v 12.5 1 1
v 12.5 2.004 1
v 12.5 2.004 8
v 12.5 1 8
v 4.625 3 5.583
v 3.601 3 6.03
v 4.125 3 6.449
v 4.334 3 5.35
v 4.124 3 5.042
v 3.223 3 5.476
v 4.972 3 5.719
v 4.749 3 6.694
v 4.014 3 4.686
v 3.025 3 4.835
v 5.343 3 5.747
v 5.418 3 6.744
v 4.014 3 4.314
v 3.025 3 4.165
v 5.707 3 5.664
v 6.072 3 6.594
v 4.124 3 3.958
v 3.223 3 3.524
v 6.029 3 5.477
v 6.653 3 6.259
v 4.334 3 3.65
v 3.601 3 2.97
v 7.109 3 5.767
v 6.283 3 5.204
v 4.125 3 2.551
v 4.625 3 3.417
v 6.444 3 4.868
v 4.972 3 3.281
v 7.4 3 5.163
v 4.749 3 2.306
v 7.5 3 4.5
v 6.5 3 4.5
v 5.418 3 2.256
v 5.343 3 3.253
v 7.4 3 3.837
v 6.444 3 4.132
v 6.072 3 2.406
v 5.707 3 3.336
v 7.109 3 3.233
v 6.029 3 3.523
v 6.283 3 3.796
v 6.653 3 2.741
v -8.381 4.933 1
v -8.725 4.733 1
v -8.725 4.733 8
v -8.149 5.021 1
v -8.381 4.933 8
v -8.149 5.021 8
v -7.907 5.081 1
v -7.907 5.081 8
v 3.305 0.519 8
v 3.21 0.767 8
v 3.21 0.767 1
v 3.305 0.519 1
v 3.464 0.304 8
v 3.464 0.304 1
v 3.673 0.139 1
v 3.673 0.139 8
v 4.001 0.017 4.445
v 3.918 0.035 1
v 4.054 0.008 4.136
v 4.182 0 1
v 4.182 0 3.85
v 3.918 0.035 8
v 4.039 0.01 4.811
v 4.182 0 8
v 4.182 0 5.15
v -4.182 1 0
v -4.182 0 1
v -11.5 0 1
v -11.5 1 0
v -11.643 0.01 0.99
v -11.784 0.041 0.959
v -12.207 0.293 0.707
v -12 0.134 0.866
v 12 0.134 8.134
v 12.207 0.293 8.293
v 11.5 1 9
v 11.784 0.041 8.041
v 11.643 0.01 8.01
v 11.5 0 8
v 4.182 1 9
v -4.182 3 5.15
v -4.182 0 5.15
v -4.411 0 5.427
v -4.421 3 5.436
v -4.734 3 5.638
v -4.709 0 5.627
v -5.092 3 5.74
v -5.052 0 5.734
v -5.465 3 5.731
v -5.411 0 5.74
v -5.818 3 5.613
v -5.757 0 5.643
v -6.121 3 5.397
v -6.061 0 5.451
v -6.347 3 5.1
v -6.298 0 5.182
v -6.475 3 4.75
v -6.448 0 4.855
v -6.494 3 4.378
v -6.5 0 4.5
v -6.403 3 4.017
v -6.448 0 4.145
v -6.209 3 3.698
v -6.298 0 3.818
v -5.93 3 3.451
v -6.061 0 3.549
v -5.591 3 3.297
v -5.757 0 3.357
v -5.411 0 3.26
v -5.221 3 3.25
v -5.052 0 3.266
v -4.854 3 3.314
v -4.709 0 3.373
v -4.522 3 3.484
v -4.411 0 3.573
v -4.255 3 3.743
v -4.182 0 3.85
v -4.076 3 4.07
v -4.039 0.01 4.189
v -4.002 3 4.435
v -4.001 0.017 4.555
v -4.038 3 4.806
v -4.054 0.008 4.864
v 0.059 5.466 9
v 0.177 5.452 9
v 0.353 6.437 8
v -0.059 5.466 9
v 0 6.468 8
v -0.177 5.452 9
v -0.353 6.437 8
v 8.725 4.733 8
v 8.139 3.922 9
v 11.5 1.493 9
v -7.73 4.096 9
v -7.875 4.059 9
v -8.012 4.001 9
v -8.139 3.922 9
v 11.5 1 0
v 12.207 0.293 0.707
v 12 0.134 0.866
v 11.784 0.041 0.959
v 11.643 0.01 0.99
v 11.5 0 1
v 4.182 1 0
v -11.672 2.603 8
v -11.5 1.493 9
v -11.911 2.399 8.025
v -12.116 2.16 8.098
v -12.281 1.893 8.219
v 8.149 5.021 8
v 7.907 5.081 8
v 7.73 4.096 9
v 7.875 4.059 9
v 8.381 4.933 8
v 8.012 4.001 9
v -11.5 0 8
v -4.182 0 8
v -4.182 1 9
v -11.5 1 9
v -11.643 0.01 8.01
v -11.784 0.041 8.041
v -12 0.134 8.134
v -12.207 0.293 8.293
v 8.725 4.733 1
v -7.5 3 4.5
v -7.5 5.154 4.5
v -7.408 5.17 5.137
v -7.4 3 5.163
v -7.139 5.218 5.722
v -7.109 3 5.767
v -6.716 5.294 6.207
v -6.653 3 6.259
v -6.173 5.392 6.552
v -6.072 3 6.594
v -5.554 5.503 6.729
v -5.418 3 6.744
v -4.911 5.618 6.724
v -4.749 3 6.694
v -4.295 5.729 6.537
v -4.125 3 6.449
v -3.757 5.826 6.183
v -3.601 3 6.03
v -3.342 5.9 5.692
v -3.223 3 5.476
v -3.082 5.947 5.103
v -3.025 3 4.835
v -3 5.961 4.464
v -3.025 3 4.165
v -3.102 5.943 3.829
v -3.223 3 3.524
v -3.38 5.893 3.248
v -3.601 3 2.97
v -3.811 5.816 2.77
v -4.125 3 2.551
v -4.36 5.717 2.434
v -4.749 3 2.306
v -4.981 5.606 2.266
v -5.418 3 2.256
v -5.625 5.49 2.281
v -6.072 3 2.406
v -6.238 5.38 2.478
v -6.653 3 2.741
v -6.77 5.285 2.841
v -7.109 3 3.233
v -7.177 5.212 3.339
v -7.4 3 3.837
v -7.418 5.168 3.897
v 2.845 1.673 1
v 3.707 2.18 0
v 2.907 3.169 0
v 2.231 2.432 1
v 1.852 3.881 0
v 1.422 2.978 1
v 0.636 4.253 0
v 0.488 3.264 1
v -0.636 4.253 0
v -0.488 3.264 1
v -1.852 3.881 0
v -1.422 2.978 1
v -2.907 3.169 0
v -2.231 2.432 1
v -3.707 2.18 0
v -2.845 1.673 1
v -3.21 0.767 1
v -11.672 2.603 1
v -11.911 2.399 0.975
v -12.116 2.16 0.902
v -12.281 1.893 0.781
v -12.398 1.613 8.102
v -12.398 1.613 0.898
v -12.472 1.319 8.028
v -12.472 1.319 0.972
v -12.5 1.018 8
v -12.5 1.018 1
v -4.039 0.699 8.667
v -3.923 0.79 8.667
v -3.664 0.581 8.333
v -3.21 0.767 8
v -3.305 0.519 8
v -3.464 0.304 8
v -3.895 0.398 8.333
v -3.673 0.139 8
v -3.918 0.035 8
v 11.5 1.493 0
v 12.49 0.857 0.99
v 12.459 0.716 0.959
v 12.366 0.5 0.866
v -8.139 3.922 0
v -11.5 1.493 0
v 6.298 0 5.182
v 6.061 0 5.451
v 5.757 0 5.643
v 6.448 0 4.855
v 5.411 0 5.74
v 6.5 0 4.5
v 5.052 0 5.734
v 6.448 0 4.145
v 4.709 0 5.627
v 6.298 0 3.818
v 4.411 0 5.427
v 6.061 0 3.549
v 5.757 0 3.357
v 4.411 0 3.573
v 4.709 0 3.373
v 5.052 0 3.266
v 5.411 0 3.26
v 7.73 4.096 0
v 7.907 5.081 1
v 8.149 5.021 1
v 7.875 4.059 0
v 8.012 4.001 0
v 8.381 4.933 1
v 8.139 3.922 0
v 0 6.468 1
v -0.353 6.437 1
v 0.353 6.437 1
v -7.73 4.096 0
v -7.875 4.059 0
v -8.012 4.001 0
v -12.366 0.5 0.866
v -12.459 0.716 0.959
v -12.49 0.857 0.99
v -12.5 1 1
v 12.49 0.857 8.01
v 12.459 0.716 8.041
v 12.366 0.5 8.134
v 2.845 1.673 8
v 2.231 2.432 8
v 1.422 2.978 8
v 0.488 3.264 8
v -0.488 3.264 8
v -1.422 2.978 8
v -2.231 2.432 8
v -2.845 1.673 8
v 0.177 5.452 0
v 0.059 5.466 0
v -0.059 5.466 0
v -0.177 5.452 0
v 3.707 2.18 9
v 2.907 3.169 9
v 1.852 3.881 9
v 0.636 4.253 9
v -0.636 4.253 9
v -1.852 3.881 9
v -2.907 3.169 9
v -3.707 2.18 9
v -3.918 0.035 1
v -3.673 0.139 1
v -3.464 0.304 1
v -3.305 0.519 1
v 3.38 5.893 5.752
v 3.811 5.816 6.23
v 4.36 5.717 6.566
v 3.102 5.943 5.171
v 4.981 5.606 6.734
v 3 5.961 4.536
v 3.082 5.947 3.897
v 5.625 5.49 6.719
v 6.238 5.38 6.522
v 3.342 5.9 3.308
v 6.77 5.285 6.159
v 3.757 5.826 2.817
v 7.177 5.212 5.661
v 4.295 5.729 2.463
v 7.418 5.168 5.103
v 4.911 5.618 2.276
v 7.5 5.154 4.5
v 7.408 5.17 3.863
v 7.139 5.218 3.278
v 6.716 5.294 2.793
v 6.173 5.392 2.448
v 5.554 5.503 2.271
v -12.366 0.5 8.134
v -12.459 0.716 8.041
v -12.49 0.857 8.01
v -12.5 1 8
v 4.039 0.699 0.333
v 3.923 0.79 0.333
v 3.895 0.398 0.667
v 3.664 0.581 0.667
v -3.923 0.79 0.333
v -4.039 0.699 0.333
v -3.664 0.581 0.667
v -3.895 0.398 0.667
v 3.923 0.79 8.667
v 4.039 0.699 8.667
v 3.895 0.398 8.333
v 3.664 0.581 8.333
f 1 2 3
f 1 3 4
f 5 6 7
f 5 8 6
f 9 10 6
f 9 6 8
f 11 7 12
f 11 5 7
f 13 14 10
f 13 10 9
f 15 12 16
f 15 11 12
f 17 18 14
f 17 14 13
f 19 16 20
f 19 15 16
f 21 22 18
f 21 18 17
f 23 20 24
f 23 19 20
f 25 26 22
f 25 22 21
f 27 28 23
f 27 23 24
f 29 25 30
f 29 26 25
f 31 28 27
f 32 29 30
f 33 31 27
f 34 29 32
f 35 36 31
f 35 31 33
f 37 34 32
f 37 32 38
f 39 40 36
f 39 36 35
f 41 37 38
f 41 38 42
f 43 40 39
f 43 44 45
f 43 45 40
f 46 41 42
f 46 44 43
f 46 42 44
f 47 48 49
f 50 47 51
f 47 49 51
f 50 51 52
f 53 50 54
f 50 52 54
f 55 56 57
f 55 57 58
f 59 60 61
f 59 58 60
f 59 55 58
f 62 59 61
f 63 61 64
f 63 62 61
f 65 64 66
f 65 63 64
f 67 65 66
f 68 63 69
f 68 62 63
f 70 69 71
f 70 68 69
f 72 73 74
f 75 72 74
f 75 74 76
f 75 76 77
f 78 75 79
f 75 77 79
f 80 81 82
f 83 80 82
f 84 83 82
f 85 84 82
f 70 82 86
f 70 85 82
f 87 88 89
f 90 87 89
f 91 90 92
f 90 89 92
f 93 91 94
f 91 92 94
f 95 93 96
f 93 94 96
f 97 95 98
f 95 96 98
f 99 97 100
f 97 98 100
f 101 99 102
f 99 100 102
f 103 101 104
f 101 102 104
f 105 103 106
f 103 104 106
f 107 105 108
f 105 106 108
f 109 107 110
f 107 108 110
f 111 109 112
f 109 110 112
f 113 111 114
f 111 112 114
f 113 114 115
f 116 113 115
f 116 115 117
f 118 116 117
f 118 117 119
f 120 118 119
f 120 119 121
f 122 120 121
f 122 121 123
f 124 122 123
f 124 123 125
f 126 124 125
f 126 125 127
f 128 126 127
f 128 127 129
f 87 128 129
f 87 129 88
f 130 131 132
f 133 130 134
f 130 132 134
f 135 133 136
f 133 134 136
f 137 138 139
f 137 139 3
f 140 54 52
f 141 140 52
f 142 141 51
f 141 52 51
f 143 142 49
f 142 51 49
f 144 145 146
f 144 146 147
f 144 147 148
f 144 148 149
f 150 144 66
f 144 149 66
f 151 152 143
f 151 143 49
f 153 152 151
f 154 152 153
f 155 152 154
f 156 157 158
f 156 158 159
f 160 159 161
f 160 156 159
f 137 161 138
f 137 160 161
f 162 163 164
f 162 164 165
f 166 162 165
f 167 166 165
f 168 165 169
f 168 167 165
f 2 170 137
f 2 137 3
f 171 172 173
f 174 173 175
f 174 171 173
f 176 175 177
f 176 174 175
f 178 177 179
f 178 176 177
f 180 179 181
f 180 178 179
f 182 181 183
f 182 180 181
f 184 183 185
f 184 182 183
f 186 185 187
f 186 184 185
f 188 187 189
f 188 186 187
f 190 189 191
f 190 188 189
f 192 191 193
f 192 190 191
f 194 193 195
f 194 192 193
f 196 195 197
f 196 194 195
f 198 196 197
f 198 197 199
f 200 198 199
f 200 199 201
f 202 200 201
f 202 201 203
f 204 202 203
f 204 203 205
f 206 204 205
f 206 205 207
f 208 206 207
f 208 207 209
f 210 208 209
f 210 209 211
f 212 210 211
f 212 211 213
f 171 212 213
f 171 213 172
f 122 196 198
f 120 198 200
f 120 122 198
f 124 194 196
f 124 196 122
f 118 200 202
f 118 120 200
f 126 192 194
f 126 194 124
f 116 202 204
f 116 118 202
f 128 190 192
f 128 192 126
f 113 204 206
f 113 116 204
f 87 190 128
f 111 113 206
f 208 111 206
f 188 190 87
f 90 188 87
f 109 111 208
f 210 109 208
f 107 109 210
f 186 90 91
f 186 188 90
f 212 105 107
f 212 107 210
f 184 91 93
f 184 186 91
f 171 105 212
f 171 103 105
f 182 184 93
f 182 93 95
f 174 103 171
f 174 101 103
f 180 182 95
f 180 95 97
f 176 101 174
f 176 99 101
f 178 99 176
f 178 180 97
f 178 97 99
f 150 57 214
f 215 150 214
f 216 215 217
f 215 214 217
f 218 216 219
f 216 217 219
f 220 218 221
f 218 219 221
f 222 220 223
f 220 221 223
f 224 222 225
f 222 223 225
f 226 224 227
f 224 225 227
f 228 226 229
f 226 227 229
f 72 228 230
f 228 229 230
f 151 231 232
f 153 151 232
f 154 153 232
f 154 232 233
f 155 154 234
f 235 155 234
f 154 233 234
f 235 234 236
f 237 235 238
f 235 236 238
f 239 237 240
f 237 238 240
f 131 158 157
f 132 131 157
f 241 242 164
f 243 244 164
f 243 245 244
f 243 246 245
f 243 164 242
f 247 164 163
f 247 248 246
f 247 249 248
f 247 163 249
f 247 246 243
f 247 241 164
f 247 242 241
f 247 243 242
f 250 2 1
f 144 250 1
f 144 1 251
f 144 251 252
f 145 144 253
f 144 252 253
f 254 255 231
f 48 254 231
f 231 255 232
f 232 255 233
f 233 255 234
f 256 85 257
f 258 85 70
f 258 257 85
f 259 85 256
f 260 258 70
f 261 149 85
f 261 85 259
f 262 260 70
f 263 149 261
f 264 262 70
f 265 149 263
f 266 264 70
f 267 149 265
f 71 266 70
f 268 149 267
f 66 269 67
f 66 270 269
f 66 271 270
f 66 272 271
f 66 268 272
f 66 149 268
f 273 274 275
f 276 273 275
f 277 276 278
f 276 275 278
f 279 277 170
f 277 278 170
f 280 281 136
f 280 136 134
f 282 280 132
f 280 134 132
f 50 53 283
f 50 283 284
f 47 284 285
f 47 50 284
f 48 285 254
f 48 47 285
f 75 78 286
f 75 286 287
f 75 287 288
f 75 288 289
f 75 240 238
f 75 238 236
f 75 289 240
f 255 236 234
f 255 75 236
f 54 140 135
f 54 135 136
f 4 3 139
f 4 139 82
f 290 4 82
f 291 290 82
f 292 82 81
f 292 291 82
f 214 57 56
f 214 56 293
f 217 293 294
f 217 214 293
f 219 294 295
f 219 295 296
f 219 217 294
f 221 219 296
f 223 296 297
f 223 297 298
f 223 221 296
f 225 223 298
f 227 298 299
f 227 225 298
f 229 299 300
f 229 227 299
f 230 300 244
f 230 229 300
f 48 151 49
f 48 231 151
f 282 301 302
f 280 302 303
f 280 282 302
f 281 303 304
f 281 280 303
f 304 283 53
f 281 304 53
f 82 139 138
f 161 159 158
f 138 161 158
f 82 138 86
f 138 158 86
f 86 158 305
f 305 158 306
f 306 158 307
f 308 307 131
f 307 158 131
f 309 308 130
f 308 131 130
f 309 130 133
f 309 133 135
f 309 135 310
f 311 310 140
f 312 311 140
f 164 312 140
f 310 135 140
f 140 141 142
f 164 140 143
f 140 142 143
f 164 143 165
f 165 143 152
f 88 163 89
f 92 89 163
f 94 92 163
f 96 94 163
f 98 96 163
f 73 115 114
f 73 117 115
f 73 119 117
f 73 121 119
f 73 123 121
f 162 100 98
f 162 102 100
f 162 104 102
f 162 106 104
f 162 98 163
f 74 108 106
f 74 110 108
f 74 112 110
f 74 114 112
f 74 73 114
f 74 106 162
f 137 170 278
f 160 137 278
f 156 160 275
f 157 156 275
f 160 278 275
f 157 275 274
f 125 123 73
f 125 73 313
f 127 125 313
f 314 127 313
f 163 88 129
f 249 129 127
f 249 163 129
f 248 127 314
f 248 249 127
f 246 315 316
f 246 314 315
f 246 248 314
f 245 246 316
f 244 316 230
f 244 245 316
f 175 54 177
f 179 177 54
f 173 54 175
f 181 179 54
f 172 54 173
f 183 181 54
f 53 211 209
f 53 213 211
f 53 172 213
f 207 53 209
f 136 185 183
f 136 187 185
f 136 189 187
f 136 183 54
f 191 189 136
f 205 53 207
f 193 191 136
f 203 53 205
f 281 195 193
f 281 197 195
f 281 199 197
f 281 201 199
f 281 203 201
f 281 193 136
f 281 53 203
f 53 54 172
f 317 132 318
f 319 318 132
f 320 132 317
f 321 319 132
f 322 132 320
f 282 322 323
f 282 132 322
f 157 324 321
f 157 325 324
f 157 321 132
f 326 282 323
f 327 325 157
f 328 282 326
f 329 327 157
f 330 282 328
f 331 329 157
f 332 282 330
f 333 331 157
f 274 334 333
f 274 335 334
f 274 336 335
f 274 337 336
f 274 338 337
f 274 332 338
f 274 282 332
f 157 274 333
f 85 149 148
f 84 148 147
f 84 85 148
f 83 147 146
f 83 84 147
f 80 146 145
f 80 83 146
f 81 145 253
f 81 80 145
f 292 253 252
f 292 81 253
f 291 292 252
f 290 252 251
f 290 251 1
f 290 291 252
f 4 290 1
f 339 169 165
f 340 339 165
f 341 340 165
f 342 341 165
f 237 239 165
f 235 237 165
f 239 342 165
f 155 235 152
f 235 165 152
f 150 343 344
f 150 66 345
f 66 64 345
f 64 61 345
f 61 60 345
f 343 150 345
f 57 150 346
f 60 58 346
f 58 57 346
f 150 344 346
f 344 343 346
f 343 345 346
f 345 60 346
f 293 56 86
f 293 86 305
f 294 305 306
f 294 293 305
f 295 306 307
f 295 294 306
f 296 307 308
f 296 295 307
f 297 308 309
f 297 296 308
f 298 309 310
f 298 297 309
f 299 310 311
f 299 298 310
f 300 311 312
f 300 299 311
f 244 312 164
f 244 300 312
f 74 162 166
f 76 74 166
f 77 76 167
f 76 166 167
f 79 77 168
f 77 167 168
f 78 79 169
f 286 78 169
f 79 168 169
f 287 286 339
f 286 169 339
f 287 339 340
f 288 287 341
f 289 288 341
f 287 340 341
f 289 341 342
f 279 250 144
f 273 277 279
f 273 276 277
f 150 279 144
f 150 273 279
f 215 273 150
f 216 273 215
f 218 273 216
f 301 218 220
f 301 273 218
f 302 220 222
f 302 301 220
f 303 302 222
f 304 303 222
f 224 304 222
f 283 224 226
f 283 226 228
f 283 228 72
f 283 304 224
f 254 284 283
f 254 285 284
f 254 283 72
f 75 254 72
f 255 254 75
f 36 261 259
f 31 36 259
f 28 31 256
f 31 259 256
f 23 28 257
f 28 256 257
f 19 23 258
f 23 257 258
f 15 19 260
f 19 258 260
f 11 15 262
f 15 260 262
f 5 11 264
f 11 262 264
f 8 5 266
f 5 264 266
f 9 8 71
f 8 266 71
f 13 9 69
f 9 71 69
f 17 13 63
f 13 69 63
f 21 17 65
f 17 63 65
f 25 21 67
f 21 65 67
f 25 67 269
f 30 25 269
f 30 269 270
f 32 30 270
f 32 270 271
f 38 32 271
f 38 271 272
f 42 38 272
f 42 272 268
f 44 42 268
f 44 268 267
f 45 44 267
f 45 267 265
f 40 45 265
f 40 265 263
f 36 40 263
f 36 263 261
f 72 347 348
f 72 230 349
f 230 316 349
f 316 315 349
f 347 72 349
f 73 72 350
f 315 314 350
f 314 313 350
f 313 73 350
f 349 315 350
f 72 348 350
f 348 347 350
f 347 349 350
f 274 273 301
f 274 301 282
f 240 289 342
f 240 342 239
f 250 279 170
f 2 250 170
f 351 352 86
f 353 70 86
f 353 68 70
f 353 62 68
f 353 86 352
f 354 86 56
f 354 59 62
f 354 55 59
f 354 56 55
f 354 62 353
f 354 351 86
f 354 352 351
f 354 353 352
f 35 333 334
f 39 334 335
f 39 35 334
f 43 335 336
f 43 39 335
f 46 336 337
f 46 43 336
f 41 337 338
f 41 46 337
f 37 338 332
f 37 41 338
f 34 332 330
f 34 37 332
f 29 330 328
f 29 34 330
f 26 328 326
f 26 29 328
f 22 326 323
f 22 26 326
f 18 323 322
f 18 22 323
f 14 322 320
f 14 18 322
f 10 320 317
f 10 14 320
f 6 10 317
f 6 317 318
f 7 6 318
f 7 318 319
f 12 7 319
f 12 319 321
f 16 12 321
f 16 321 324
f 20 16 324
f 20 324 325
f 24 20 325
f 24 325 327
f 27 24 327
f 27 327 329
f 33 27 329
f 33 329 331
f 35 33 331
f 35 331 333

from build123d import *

# Parameters (mm, degrees)
BOSS_EXTRUDE1_DEPTH     = 9
CUT_EXTRUDE1_DEPTH      = 17.718253497
CUT_EXTRUDE1_DEPTH_BACK = 17.718253497
CHAMFER1_SIZE           = 1
FILLET3_R               = 1
SKETCH4_R               = 1.25
CUT_EXTRUDE2_DEPTH      = 17.718253497
CUT_EXTRUDE3_START      = 3
SKETCH5_R               = 2.25
CUT_EXTRUDE3_DEPTH      = 10
FILLET2_R               = 2
CHAMFER2_SIZE           = 1
CHAMFER3_SIZE           = 1


with BuildPart() as part:
    # Sketch1 → Boss-Extrude1 (new body)
    with BuildSketch(Plane.XY):
        with BuildLine():
            Line((-3.3, 0), (-12.5, 0))
            Line((-12.5, 0), (-12.5, 6.5))
            Line((-12.5, 6.5), (12.5, 6.5))
            Line((12.5, 6.5), (12.5, 0))
            Line((12.5, 0), (3.3, 0))
            ThreePointArc((3.3, 0), (0, 3.3), (-3.3, 0))
        make_face()
    extrude(amount=BOSS_EXTRUDE1_DEPTH)

    # Sketch2 → Cut-Extrude1 (cut, two sides: drawn at the far end of the back side and taken through both)
    with BuildSketch(Plane.XY.offset(9).offset(-CUT_EXTRUDE1_DEPTH_BACK)):
        Polygon((-8.355690819, 5), (0, 6.5), (-12.5, 6.5), (-12.5, 2.004439372), align=None)
        Polygon((12.5, 6.5), (0, 6.5), (8.355690819, 5), (12.5, 2.004439372), align=None)
    extrude(amount=CUT_EXTRUDE1_DEPTH + CUT_EXTRUDE1_DEPTH_BACK, mode=Mode.SUBTRACT)

    # Chamfer1
    chamfer1_edges = [part.edges().sort_by_distance(p)[0] for p in [
        (12.5, 1.002219686, 9),
        (-12.5, 1.002219686, 0),
        (-12.5, 1.002219686, 9),
        (12.5, 1.002219686, 0),
    ]]
    chamfer(chamfer1_edges, length=CHAMFER1_SIZE)

    # Fillet3
    fillet3_edges = [part.edges().sort_by_distance(p)[0] for p in [
        (12.5, 0, 4.5),
        (3.3, 0, 4.5),
        (-12.5, 0, 4.5),
        (-3.3, 0, 4.5),
    ]]
    fillet(fillet3_edges, radius=FILLET3_R)

    # Sketch4 → Cut-Extrude2 (cut, through all)
    with BuildSketch(Plane.XZ):
        with Locations(Location((-5.25, 4.5, 0), (0, 0, 31.315725107))):
            Circle(SKETCH4_R)
        with Locations((5.25, 4.5)):
            Circle(SKETCH4_R)
    extrude(amount=-CUT_EXTRUDE2_DEPTH, mode=Mode.SUBTRACT)

    # Sketch5 → Cut-Extrude3 (cut)
    with BuildSketch(Plane(origin=(0, 0, 0), x_dir=(1, 0, 0), z_dir=(0, 1, 0)).offset(CUT_EXTRUDE3_START)):
        with Locations(Location((-5.25, -4.5, 0), (0, 0, 180))):
            Circle(SKETCH5_R)
        with Locations((5.25, -4.5)):
            Circle(SKETCH5_R)
    extrude(amount=CUT_EXTRUDE3_DEPTH, mode=Mode.SUBTRACT)

    # Fillet2
    # the kernel refuses this fillet: 2 mm, written as the material it takes off along each edge
    with BuildSketch(Plane(origin=(8.355690819, 5, -1.139765225), x_dir=(0.8104519016588886, -0.5858051852770605, 0), z_dir=(0, 0, 1))) as fillet2_piece_1:
        with BuildLine():
            CenterArc((FILLET2_R * 0.227953044968, -FILLET2_R), FILLET2_R, 90, 25.682650877)
            Line((-FILLET2_R * 0.20543317424, -FILLET2_R * 0.0987917083155), (0, 0))
            Line((0, 0), (FILLET2_R * 0.227953044968, 0))
        make_face()
    extrude(amount=11.27953045, mode=Mode.SUBTRACT)
    with BuildSketch(Plane(origin=(-8.355690819, 5, 10.139765225), x_dir=(0.9842658682259174, 0.17669380477391092, 0), z_dir=(0, 0, -1))) as fillet2_piece_2:
        with BuildLine():
            CenterArc((FILLET2_R * 0.227953044968, FILLET2_R), FILLET2_R, 244.317349123, 25.682650877)
            Line((-FILLET2_R * 0.20543317424, FILLET2_R * 0.0987917083155), (0, 0))
            Line((0, 0), (FILLET2_R * 0.227953044968, 0))
        make_face()
    extrude(amount=11.27953045, mode=Mode.SUBTRACT)
    with BuildSketch(Plane(origin=(0, 6.5, 9.897591852), x_dir=(0.9842658682259177, -0.17669380477391017, 0), z_dir=(0, 0, -1))) as fillet2_piece_3:
        with BuildLine():
            CenterArc((FILLET2_R * 0.179518370471, FILLET2_R), FILLET2_R, 249.645515661, 20.354484339)
            Line((-FILLET2_R * 0.168308991861, FILLET2_R * 0.062441401291), (0, 0))
            Line((0, 0), (FILLET2_R * 0.179518370471, 0))
        make_face()
    extrude(amount=10.795183705, mode=Mode.SUBTRACT)
    with BuildSketch(Plane(origin=(-12.5, 2.004439372, -1.554843318), x_dir=(0.8104519016588881, 0.5858051852770613, 0), z_dir=(0, 0, 1))) as fillet2_piece_4:
        with BuildLine():
            CenterArc((1.021937327, -2), FILLET2_R, 90, 53.119715667)
            Line((-0.577845108, -0.799709969), (-0.737823352, -0.679680966))
            ThreePointArc((-0.737823352, -0.679680966), (-0.750496173, -0.696888762), (-0.16209038, 0.117161037))
            Line((-0.16209038, 0.117161037), (0, 0.2))
            Line((0, 0.2), (1.021937327, 0.2))
            Line((1.021937327, 0.2), (1.021937327, 0))
        make_face()
    extrude(amount=12.109686635, mode=Mode.SUBTRACT)

    # Chamfer2
    chamfer2_edges = [part.edges().sort_by_distance(p)[0] for p in [
        (7.841052367, 0, 0),
        (3.562652612, 0.214965561, 0),
        (-7.841052367, 0, 0),
        (-3.562652612, 0.214965561, 0),
        (0, 3.3, 0),
    ]]
    chamfer(chamfer2_edges, length=CHAMFER2_SIZE)
    # the kernel refuses this chamfer: 1 mm, written as the material it takes off along each edge
    with BuildSketch(Plane(origin=(8.725180777, 4.732927849, 0), x_dir=(-0.585583702243233, -0.8101454835006636, -0.027495876610586348), z_dir=(0.8104519016588884, -0.5858051852770609, 0)), Plane(origin=(-13.584225368, 1.220747161, 0), x_dir=(0.5855837022432331, -0.8101454835006635, -0.027495876610586348), z_dir=(0.8104519016588883, 0.585805185277061, 0))) as chamfer2_2_piece_1:
        with BuildLine():
            Line((1.028673195, 0), (-0.056547155, -1.027117794))
            Line((-0.056547155, -1.027117794), (-0.076539593, -1.026567876))
            ThreePointArc((-0.076539593, -1.026567876), (-0.034129227, -0.51339783), (-0.019992438, 0.000549918))
            Line((-0.019992438, 0.000549918), (0.000549918, 0.019992438))
            ThreePointArc((0.000549918, 0.019992438), (0.514497665, 0.00585565), (1.029223113, 0.019992438))
            Line((1.029223113, 0.019992438), (1.028673195, 0))
        make_face()
    extrude(amount=5.995475588, mode=Mode.SUBTRACT)
    with BuildSketch(Plane(origin=(7.553570406, 3.112024045, 0), x_dir=(0.1766938047737976, 0.9842658682259378, 0), z_dir=(-0.9842658682259378, 0.1766938047737976, 0))) as chamfer2_2_piece_2:
        with BuildLine():
            Line((0.971715729, 0.028284271), (2.028284271, -1.028284271))
            Line((2.028284271, -1.028284271), (2.048284271, -1.028284271))
            ThreePointArc((2.048284271, -1.028284271), (2.02, -0.514142136), (2.02, 0))
            Line((2.02, 0), (2, 0.02))
            ThreePointArc((2, 0.02), (1.485857864, 0.02), (0.971715729, 0.048284271))
            Line((0.971715729, 0.048284271), (0.971715729, 0.028284271))
        make_face()
    revolve(axis=Axis((7.553570406, 3.112024045, 0), (0, 0, -1)), revolution_arc=25.682650877, mode=Mode.SUBTRACT)
    with BuildSketch(Plane(origin=(0.35338761, 6.436560432, 0), x_dir=(-0.176626999834447, -0.9838937339463534, -0.027495876610586348), z_dir=(0.9842658682259174, -0.17669380477391067, 0)), Plane(origin=(-7.906958016, 5.080555782, 0), x_dir=(0.17662699983444718, -0.9838937339463534, -0.02749587661058635), z_dir=(0.9842658682259174, 0.17669380477391086, 0))) as chamfer2_2_piece_3:
        with BuildLine():
            Line((1.028673195, 0), (-0.056547155, -1.027117794))
            Line((-0.056547155, -1.027117794), (-0.076539593, -1.026567876))
            ThreePointArc((-0.076539593, -1.026567876), (-0.034129227, -0.51339783), (-0.019992438, 0.000549918))
            Line((-0.019992438, 0.000549918), (0.000549918, 0.019992438))
            ThreePointArc((0.000549918, 0.019992438), (0.514497665, 0.00585565), (1.029223113, 0.019992438))
            Line((1.029223113, 0.019992438), (1.028673195, 0))
        make_face()
    extrude(amount=7.674319155, mode=Mode.SUBTRACT)
    with BuildSketch(Plane(origin=(0, 4.468028696, 0), x_dir=(0.1766938047739827, 0.9842658682259047, 0), z_dir=(0.9842658682259047, -0.1766938047739827, 0))) as chamfer2_2_piece_4:
        with BuildLine():
            Line((0.971715729, -0.028284271), (2.028284271, 1.028284271))
            Line((2.028284271, 1.028284271), (2.048284271, 1.028284271))
            ThreePointArc((2.048284271, 1.028284271), (2.02, 0.514142136), (2.02, 0))
            Line((2.02, 0), (2, -0.02))
            ThreePointArc((2, -0.02), (1.485857864, -0.02), (0.971715729, -0.048284271))
            Line((0.971715729, -0.048284271), (0.971715729, -0.028284271))
        make_face()
    revolve(axis=Axis((0, 4.468028696, 0), (0, 0, 1)), revolution_arc=20.354484339, mode=Mode.SUBTRACT)
    with BuildSketch(Plane(origin=(-7.553570406, 3.112024045, 0), x_dir=(-0.17669380477398322, 0.9842658682259045, 0), z_dir=(0.9842658682259045, 0.17669380477398322, 0))) as chamfer2_2_piece_5:
        with BuildLine():
            Line((0.971715729, -0.028284271), (2.028284271, 1.028284271))
            Line((2.028284271, 1.028284271), (2.048284271, 1.028284271))
            ThreePointArc((2.048284271, 1.028284271), (2.02, 0.514142136), (2.02, 0))
            Line((2.02, 0), (2, -0.02))
            ThreePointArc((2, -0.02), (1.485857864, -0.02), (0.971715729, -0.048284271))
            Line((0.971715729, -0.048284271), (0.971715729, -0.028284271))
        make_face()
    revolve(axis=Axis((-7.553570406, 3.112024045, 0), (0, 0, 1)), revolution_arc=25.682650877, mode=Mode.SUBTRACT)

    # Chamfer3
    chamfer3_edges = [part.edges().sort_by_distance(p)[0] for p in [
        (7.841052367, 0, 9),
        (3.562652612, 0.214965561, 9),
        (-7.841052367, 0, 9),
        (-3.562652612, 0.214965561, 9),
        (0, 3.3, 9),
    ]]
    chamfer(chamfer3_edges, length=CHAMFER3_SIZE)
    # the kernel refuses this chamfer: 1 mm, written as the material it takes off along each edge
    with BuildSketch(Plane(origin=(8.725180777, 4.732927849, 9), x_dir=(-0.585583702243233, -0.8101454835006636, 0.027495876610585605), z_dir=(0.8104519016588884, -0.5858051852770609, 0)), Plane(origin=(-13.584225368, 1.220747161, 9), x_dir=(0.5855837022432332, -0.8101454835006637, 0.027495876610585605), z_dir=(0.8104519016588883, 0.585805185277061, 0))) as chamfer3_2_piece_1:
        with BuildLine():
            Line((1.028673195, 0), (-0.056547155, 1.027117794))
            Line((-0.056547155, 1.027117794), (-0.076539593, 1.026567876))
            ThreePointArc((-0.076539593, 1.026567876), (-0.034129227, 0.51339783), (-0.019992438, -0.000549918))
            Line((-0.019992438, -0.000549918), (0.000549918, -0.019992438))
            ThreePointArc((0.000549918, -0.019992438), (0.514497665, -0.00585565), (1.029223113, -0.019992438))
            Line((1.029223113, -0.019992438), (1.028673195, 0))
        make_face()
    extrude(amount=5.995475588, mode=Mode.SUBTRACT)
    with BuildSketch(Plane(origin=(7.553570406, 3.112024045, 9), x_dir=(0.1766938047737976, 0.9842658682259378, 0), z_dir=(-0.9842658682259378, 0.1766938047737976, 0))) as chamfer3_2_piece_2:
        with BuildLine():
            Line((0.971715729, -0.028284271), (2.028284271, 1.028284271))
            Line((2.028284271, 1.028284271), (2.048284271, 1.028284271))
            ThreePointArc((2.048284271, 1.028284271), (2.02, 0.514142136), (2.02, 0))
            Line((2.02, 0), (2, -0.02))
            ThreePointArc((2, -0.02), (1.485857864, -0.02), (0.971715729, -0.048284271))
            Line((0.971715729, -0.048284271), (0.971715729, -0.028284271))
        make_face()
    revolve(axis=Axis((7.553570406, 3.112024045, 9), (0, 0, -1)), revolution_arc=25.682650877, mode=Mode.SUBTRACT)
    with BuildSketch(Plane(origin=(0.35338761, 6.436560432, 9), x_dir=(-0.176626999834447, -0.9838937339463534, 0.027495876610585612), z_dir=(0.9842658682259174, -0.17669380477391067, 0)), Plane(origin=(-7.906958016, 5.080555782, 9), x_dir=(0.17662699983444718, -0.9838937339463534, 0.027495876610585612), z_dir=(0.9842658682259174, 0.17669380477391086, 0))) as chamfer3_2_piece_3:
        with BuildLine():
            Line((1.028673195, 0), (-0.056547155, 1.027117794))
            Line((-0.056547155, 1.027117794), (-0.076539593, 1.026567876))
            ThreePointArc((-0.076539593, 1.026567876), (-0.034129227, 0.51339783), (-0.019992438, -0.000549918))
            Line((-0.019992438, -0.000549918), (0.000549918, -0.019992438))
            ThreePointArc((0.000549918, -0.019992438), (0.514497665, -0.00585565), (1.029223113, -0.019992438))
            Line((1.029223113, -0.019992438), (1.028673195, 0))
        make_face()
    extrude(amount=7.674319155, mode=Mode.SUBTRACT)
    with BuildSketch(Plane(origin=(0, 4.468028696, 9), x_dir=(0.1766938047739827, 0.9842658682259047, 0), z_dir=(0.9842658682259047, -0.1766938047739827, 0))) as chamfer3_2_piece_4:
        with BuildLine():
            Line((0.971715729, 0.028284271), (2.028284271, -1.028284271))
            Line((2.028284271, -1.028284271), (2.048284271, -1.028284271))
            ThreePointArc((2.048284271, -1.028284271), (2.02, -0.514142136), (2.02, 0))
            Line((2.02, 0), (2, 0.02))
            ThreePointArc((2, 0.02), (1.485857864, 0.02), (0.971715729, 0.048284271))
            Line((0.971715729, 0.048284271), (0.971715729, 0.028284271))
        make_face()
    revolve(axis=Axis((0, 4.468028696, 9), (0, 0, 1)), revolution_arc=20.354484339, mode=Mode.SUBTRACT)
    with BuildSketch(Plane(origin=(-7.553570406, 3.112024045, 9), x_dir=(-0.17669380477398322, 0.9842658682259045, 0), z_dir=(0.9842658682259045, 0.17669380477398322, 0))) as chamfer3_2_piece_5:
        with BuildLine():
            Line((0.971715729, 0.028284271), (2.028284271, -1.028284271))
            Line((2.028284271, -1.028284271), (2.048284271, -1.028284271))
            ThreePointArc((2.048284271, -1.028284271), (2.02, -0.514142136), (2.02, 0))
            Line((2.02, 0), (2, 0.02))
            ThreePointArc((2, 0.02), (1.485857864, 0.02), (0.971715729, 0.048284271))
            Line((0.971715729, 0.048284271), (0.971715729, 0.028284271))
        make_face()
    revolve(axis=Axis((-7.553570406, 3.112024045, 9), (0, 0, 1)), revolution_arc=25.682650877, mode=Mode.SUBTRACT)


solid = part.part
